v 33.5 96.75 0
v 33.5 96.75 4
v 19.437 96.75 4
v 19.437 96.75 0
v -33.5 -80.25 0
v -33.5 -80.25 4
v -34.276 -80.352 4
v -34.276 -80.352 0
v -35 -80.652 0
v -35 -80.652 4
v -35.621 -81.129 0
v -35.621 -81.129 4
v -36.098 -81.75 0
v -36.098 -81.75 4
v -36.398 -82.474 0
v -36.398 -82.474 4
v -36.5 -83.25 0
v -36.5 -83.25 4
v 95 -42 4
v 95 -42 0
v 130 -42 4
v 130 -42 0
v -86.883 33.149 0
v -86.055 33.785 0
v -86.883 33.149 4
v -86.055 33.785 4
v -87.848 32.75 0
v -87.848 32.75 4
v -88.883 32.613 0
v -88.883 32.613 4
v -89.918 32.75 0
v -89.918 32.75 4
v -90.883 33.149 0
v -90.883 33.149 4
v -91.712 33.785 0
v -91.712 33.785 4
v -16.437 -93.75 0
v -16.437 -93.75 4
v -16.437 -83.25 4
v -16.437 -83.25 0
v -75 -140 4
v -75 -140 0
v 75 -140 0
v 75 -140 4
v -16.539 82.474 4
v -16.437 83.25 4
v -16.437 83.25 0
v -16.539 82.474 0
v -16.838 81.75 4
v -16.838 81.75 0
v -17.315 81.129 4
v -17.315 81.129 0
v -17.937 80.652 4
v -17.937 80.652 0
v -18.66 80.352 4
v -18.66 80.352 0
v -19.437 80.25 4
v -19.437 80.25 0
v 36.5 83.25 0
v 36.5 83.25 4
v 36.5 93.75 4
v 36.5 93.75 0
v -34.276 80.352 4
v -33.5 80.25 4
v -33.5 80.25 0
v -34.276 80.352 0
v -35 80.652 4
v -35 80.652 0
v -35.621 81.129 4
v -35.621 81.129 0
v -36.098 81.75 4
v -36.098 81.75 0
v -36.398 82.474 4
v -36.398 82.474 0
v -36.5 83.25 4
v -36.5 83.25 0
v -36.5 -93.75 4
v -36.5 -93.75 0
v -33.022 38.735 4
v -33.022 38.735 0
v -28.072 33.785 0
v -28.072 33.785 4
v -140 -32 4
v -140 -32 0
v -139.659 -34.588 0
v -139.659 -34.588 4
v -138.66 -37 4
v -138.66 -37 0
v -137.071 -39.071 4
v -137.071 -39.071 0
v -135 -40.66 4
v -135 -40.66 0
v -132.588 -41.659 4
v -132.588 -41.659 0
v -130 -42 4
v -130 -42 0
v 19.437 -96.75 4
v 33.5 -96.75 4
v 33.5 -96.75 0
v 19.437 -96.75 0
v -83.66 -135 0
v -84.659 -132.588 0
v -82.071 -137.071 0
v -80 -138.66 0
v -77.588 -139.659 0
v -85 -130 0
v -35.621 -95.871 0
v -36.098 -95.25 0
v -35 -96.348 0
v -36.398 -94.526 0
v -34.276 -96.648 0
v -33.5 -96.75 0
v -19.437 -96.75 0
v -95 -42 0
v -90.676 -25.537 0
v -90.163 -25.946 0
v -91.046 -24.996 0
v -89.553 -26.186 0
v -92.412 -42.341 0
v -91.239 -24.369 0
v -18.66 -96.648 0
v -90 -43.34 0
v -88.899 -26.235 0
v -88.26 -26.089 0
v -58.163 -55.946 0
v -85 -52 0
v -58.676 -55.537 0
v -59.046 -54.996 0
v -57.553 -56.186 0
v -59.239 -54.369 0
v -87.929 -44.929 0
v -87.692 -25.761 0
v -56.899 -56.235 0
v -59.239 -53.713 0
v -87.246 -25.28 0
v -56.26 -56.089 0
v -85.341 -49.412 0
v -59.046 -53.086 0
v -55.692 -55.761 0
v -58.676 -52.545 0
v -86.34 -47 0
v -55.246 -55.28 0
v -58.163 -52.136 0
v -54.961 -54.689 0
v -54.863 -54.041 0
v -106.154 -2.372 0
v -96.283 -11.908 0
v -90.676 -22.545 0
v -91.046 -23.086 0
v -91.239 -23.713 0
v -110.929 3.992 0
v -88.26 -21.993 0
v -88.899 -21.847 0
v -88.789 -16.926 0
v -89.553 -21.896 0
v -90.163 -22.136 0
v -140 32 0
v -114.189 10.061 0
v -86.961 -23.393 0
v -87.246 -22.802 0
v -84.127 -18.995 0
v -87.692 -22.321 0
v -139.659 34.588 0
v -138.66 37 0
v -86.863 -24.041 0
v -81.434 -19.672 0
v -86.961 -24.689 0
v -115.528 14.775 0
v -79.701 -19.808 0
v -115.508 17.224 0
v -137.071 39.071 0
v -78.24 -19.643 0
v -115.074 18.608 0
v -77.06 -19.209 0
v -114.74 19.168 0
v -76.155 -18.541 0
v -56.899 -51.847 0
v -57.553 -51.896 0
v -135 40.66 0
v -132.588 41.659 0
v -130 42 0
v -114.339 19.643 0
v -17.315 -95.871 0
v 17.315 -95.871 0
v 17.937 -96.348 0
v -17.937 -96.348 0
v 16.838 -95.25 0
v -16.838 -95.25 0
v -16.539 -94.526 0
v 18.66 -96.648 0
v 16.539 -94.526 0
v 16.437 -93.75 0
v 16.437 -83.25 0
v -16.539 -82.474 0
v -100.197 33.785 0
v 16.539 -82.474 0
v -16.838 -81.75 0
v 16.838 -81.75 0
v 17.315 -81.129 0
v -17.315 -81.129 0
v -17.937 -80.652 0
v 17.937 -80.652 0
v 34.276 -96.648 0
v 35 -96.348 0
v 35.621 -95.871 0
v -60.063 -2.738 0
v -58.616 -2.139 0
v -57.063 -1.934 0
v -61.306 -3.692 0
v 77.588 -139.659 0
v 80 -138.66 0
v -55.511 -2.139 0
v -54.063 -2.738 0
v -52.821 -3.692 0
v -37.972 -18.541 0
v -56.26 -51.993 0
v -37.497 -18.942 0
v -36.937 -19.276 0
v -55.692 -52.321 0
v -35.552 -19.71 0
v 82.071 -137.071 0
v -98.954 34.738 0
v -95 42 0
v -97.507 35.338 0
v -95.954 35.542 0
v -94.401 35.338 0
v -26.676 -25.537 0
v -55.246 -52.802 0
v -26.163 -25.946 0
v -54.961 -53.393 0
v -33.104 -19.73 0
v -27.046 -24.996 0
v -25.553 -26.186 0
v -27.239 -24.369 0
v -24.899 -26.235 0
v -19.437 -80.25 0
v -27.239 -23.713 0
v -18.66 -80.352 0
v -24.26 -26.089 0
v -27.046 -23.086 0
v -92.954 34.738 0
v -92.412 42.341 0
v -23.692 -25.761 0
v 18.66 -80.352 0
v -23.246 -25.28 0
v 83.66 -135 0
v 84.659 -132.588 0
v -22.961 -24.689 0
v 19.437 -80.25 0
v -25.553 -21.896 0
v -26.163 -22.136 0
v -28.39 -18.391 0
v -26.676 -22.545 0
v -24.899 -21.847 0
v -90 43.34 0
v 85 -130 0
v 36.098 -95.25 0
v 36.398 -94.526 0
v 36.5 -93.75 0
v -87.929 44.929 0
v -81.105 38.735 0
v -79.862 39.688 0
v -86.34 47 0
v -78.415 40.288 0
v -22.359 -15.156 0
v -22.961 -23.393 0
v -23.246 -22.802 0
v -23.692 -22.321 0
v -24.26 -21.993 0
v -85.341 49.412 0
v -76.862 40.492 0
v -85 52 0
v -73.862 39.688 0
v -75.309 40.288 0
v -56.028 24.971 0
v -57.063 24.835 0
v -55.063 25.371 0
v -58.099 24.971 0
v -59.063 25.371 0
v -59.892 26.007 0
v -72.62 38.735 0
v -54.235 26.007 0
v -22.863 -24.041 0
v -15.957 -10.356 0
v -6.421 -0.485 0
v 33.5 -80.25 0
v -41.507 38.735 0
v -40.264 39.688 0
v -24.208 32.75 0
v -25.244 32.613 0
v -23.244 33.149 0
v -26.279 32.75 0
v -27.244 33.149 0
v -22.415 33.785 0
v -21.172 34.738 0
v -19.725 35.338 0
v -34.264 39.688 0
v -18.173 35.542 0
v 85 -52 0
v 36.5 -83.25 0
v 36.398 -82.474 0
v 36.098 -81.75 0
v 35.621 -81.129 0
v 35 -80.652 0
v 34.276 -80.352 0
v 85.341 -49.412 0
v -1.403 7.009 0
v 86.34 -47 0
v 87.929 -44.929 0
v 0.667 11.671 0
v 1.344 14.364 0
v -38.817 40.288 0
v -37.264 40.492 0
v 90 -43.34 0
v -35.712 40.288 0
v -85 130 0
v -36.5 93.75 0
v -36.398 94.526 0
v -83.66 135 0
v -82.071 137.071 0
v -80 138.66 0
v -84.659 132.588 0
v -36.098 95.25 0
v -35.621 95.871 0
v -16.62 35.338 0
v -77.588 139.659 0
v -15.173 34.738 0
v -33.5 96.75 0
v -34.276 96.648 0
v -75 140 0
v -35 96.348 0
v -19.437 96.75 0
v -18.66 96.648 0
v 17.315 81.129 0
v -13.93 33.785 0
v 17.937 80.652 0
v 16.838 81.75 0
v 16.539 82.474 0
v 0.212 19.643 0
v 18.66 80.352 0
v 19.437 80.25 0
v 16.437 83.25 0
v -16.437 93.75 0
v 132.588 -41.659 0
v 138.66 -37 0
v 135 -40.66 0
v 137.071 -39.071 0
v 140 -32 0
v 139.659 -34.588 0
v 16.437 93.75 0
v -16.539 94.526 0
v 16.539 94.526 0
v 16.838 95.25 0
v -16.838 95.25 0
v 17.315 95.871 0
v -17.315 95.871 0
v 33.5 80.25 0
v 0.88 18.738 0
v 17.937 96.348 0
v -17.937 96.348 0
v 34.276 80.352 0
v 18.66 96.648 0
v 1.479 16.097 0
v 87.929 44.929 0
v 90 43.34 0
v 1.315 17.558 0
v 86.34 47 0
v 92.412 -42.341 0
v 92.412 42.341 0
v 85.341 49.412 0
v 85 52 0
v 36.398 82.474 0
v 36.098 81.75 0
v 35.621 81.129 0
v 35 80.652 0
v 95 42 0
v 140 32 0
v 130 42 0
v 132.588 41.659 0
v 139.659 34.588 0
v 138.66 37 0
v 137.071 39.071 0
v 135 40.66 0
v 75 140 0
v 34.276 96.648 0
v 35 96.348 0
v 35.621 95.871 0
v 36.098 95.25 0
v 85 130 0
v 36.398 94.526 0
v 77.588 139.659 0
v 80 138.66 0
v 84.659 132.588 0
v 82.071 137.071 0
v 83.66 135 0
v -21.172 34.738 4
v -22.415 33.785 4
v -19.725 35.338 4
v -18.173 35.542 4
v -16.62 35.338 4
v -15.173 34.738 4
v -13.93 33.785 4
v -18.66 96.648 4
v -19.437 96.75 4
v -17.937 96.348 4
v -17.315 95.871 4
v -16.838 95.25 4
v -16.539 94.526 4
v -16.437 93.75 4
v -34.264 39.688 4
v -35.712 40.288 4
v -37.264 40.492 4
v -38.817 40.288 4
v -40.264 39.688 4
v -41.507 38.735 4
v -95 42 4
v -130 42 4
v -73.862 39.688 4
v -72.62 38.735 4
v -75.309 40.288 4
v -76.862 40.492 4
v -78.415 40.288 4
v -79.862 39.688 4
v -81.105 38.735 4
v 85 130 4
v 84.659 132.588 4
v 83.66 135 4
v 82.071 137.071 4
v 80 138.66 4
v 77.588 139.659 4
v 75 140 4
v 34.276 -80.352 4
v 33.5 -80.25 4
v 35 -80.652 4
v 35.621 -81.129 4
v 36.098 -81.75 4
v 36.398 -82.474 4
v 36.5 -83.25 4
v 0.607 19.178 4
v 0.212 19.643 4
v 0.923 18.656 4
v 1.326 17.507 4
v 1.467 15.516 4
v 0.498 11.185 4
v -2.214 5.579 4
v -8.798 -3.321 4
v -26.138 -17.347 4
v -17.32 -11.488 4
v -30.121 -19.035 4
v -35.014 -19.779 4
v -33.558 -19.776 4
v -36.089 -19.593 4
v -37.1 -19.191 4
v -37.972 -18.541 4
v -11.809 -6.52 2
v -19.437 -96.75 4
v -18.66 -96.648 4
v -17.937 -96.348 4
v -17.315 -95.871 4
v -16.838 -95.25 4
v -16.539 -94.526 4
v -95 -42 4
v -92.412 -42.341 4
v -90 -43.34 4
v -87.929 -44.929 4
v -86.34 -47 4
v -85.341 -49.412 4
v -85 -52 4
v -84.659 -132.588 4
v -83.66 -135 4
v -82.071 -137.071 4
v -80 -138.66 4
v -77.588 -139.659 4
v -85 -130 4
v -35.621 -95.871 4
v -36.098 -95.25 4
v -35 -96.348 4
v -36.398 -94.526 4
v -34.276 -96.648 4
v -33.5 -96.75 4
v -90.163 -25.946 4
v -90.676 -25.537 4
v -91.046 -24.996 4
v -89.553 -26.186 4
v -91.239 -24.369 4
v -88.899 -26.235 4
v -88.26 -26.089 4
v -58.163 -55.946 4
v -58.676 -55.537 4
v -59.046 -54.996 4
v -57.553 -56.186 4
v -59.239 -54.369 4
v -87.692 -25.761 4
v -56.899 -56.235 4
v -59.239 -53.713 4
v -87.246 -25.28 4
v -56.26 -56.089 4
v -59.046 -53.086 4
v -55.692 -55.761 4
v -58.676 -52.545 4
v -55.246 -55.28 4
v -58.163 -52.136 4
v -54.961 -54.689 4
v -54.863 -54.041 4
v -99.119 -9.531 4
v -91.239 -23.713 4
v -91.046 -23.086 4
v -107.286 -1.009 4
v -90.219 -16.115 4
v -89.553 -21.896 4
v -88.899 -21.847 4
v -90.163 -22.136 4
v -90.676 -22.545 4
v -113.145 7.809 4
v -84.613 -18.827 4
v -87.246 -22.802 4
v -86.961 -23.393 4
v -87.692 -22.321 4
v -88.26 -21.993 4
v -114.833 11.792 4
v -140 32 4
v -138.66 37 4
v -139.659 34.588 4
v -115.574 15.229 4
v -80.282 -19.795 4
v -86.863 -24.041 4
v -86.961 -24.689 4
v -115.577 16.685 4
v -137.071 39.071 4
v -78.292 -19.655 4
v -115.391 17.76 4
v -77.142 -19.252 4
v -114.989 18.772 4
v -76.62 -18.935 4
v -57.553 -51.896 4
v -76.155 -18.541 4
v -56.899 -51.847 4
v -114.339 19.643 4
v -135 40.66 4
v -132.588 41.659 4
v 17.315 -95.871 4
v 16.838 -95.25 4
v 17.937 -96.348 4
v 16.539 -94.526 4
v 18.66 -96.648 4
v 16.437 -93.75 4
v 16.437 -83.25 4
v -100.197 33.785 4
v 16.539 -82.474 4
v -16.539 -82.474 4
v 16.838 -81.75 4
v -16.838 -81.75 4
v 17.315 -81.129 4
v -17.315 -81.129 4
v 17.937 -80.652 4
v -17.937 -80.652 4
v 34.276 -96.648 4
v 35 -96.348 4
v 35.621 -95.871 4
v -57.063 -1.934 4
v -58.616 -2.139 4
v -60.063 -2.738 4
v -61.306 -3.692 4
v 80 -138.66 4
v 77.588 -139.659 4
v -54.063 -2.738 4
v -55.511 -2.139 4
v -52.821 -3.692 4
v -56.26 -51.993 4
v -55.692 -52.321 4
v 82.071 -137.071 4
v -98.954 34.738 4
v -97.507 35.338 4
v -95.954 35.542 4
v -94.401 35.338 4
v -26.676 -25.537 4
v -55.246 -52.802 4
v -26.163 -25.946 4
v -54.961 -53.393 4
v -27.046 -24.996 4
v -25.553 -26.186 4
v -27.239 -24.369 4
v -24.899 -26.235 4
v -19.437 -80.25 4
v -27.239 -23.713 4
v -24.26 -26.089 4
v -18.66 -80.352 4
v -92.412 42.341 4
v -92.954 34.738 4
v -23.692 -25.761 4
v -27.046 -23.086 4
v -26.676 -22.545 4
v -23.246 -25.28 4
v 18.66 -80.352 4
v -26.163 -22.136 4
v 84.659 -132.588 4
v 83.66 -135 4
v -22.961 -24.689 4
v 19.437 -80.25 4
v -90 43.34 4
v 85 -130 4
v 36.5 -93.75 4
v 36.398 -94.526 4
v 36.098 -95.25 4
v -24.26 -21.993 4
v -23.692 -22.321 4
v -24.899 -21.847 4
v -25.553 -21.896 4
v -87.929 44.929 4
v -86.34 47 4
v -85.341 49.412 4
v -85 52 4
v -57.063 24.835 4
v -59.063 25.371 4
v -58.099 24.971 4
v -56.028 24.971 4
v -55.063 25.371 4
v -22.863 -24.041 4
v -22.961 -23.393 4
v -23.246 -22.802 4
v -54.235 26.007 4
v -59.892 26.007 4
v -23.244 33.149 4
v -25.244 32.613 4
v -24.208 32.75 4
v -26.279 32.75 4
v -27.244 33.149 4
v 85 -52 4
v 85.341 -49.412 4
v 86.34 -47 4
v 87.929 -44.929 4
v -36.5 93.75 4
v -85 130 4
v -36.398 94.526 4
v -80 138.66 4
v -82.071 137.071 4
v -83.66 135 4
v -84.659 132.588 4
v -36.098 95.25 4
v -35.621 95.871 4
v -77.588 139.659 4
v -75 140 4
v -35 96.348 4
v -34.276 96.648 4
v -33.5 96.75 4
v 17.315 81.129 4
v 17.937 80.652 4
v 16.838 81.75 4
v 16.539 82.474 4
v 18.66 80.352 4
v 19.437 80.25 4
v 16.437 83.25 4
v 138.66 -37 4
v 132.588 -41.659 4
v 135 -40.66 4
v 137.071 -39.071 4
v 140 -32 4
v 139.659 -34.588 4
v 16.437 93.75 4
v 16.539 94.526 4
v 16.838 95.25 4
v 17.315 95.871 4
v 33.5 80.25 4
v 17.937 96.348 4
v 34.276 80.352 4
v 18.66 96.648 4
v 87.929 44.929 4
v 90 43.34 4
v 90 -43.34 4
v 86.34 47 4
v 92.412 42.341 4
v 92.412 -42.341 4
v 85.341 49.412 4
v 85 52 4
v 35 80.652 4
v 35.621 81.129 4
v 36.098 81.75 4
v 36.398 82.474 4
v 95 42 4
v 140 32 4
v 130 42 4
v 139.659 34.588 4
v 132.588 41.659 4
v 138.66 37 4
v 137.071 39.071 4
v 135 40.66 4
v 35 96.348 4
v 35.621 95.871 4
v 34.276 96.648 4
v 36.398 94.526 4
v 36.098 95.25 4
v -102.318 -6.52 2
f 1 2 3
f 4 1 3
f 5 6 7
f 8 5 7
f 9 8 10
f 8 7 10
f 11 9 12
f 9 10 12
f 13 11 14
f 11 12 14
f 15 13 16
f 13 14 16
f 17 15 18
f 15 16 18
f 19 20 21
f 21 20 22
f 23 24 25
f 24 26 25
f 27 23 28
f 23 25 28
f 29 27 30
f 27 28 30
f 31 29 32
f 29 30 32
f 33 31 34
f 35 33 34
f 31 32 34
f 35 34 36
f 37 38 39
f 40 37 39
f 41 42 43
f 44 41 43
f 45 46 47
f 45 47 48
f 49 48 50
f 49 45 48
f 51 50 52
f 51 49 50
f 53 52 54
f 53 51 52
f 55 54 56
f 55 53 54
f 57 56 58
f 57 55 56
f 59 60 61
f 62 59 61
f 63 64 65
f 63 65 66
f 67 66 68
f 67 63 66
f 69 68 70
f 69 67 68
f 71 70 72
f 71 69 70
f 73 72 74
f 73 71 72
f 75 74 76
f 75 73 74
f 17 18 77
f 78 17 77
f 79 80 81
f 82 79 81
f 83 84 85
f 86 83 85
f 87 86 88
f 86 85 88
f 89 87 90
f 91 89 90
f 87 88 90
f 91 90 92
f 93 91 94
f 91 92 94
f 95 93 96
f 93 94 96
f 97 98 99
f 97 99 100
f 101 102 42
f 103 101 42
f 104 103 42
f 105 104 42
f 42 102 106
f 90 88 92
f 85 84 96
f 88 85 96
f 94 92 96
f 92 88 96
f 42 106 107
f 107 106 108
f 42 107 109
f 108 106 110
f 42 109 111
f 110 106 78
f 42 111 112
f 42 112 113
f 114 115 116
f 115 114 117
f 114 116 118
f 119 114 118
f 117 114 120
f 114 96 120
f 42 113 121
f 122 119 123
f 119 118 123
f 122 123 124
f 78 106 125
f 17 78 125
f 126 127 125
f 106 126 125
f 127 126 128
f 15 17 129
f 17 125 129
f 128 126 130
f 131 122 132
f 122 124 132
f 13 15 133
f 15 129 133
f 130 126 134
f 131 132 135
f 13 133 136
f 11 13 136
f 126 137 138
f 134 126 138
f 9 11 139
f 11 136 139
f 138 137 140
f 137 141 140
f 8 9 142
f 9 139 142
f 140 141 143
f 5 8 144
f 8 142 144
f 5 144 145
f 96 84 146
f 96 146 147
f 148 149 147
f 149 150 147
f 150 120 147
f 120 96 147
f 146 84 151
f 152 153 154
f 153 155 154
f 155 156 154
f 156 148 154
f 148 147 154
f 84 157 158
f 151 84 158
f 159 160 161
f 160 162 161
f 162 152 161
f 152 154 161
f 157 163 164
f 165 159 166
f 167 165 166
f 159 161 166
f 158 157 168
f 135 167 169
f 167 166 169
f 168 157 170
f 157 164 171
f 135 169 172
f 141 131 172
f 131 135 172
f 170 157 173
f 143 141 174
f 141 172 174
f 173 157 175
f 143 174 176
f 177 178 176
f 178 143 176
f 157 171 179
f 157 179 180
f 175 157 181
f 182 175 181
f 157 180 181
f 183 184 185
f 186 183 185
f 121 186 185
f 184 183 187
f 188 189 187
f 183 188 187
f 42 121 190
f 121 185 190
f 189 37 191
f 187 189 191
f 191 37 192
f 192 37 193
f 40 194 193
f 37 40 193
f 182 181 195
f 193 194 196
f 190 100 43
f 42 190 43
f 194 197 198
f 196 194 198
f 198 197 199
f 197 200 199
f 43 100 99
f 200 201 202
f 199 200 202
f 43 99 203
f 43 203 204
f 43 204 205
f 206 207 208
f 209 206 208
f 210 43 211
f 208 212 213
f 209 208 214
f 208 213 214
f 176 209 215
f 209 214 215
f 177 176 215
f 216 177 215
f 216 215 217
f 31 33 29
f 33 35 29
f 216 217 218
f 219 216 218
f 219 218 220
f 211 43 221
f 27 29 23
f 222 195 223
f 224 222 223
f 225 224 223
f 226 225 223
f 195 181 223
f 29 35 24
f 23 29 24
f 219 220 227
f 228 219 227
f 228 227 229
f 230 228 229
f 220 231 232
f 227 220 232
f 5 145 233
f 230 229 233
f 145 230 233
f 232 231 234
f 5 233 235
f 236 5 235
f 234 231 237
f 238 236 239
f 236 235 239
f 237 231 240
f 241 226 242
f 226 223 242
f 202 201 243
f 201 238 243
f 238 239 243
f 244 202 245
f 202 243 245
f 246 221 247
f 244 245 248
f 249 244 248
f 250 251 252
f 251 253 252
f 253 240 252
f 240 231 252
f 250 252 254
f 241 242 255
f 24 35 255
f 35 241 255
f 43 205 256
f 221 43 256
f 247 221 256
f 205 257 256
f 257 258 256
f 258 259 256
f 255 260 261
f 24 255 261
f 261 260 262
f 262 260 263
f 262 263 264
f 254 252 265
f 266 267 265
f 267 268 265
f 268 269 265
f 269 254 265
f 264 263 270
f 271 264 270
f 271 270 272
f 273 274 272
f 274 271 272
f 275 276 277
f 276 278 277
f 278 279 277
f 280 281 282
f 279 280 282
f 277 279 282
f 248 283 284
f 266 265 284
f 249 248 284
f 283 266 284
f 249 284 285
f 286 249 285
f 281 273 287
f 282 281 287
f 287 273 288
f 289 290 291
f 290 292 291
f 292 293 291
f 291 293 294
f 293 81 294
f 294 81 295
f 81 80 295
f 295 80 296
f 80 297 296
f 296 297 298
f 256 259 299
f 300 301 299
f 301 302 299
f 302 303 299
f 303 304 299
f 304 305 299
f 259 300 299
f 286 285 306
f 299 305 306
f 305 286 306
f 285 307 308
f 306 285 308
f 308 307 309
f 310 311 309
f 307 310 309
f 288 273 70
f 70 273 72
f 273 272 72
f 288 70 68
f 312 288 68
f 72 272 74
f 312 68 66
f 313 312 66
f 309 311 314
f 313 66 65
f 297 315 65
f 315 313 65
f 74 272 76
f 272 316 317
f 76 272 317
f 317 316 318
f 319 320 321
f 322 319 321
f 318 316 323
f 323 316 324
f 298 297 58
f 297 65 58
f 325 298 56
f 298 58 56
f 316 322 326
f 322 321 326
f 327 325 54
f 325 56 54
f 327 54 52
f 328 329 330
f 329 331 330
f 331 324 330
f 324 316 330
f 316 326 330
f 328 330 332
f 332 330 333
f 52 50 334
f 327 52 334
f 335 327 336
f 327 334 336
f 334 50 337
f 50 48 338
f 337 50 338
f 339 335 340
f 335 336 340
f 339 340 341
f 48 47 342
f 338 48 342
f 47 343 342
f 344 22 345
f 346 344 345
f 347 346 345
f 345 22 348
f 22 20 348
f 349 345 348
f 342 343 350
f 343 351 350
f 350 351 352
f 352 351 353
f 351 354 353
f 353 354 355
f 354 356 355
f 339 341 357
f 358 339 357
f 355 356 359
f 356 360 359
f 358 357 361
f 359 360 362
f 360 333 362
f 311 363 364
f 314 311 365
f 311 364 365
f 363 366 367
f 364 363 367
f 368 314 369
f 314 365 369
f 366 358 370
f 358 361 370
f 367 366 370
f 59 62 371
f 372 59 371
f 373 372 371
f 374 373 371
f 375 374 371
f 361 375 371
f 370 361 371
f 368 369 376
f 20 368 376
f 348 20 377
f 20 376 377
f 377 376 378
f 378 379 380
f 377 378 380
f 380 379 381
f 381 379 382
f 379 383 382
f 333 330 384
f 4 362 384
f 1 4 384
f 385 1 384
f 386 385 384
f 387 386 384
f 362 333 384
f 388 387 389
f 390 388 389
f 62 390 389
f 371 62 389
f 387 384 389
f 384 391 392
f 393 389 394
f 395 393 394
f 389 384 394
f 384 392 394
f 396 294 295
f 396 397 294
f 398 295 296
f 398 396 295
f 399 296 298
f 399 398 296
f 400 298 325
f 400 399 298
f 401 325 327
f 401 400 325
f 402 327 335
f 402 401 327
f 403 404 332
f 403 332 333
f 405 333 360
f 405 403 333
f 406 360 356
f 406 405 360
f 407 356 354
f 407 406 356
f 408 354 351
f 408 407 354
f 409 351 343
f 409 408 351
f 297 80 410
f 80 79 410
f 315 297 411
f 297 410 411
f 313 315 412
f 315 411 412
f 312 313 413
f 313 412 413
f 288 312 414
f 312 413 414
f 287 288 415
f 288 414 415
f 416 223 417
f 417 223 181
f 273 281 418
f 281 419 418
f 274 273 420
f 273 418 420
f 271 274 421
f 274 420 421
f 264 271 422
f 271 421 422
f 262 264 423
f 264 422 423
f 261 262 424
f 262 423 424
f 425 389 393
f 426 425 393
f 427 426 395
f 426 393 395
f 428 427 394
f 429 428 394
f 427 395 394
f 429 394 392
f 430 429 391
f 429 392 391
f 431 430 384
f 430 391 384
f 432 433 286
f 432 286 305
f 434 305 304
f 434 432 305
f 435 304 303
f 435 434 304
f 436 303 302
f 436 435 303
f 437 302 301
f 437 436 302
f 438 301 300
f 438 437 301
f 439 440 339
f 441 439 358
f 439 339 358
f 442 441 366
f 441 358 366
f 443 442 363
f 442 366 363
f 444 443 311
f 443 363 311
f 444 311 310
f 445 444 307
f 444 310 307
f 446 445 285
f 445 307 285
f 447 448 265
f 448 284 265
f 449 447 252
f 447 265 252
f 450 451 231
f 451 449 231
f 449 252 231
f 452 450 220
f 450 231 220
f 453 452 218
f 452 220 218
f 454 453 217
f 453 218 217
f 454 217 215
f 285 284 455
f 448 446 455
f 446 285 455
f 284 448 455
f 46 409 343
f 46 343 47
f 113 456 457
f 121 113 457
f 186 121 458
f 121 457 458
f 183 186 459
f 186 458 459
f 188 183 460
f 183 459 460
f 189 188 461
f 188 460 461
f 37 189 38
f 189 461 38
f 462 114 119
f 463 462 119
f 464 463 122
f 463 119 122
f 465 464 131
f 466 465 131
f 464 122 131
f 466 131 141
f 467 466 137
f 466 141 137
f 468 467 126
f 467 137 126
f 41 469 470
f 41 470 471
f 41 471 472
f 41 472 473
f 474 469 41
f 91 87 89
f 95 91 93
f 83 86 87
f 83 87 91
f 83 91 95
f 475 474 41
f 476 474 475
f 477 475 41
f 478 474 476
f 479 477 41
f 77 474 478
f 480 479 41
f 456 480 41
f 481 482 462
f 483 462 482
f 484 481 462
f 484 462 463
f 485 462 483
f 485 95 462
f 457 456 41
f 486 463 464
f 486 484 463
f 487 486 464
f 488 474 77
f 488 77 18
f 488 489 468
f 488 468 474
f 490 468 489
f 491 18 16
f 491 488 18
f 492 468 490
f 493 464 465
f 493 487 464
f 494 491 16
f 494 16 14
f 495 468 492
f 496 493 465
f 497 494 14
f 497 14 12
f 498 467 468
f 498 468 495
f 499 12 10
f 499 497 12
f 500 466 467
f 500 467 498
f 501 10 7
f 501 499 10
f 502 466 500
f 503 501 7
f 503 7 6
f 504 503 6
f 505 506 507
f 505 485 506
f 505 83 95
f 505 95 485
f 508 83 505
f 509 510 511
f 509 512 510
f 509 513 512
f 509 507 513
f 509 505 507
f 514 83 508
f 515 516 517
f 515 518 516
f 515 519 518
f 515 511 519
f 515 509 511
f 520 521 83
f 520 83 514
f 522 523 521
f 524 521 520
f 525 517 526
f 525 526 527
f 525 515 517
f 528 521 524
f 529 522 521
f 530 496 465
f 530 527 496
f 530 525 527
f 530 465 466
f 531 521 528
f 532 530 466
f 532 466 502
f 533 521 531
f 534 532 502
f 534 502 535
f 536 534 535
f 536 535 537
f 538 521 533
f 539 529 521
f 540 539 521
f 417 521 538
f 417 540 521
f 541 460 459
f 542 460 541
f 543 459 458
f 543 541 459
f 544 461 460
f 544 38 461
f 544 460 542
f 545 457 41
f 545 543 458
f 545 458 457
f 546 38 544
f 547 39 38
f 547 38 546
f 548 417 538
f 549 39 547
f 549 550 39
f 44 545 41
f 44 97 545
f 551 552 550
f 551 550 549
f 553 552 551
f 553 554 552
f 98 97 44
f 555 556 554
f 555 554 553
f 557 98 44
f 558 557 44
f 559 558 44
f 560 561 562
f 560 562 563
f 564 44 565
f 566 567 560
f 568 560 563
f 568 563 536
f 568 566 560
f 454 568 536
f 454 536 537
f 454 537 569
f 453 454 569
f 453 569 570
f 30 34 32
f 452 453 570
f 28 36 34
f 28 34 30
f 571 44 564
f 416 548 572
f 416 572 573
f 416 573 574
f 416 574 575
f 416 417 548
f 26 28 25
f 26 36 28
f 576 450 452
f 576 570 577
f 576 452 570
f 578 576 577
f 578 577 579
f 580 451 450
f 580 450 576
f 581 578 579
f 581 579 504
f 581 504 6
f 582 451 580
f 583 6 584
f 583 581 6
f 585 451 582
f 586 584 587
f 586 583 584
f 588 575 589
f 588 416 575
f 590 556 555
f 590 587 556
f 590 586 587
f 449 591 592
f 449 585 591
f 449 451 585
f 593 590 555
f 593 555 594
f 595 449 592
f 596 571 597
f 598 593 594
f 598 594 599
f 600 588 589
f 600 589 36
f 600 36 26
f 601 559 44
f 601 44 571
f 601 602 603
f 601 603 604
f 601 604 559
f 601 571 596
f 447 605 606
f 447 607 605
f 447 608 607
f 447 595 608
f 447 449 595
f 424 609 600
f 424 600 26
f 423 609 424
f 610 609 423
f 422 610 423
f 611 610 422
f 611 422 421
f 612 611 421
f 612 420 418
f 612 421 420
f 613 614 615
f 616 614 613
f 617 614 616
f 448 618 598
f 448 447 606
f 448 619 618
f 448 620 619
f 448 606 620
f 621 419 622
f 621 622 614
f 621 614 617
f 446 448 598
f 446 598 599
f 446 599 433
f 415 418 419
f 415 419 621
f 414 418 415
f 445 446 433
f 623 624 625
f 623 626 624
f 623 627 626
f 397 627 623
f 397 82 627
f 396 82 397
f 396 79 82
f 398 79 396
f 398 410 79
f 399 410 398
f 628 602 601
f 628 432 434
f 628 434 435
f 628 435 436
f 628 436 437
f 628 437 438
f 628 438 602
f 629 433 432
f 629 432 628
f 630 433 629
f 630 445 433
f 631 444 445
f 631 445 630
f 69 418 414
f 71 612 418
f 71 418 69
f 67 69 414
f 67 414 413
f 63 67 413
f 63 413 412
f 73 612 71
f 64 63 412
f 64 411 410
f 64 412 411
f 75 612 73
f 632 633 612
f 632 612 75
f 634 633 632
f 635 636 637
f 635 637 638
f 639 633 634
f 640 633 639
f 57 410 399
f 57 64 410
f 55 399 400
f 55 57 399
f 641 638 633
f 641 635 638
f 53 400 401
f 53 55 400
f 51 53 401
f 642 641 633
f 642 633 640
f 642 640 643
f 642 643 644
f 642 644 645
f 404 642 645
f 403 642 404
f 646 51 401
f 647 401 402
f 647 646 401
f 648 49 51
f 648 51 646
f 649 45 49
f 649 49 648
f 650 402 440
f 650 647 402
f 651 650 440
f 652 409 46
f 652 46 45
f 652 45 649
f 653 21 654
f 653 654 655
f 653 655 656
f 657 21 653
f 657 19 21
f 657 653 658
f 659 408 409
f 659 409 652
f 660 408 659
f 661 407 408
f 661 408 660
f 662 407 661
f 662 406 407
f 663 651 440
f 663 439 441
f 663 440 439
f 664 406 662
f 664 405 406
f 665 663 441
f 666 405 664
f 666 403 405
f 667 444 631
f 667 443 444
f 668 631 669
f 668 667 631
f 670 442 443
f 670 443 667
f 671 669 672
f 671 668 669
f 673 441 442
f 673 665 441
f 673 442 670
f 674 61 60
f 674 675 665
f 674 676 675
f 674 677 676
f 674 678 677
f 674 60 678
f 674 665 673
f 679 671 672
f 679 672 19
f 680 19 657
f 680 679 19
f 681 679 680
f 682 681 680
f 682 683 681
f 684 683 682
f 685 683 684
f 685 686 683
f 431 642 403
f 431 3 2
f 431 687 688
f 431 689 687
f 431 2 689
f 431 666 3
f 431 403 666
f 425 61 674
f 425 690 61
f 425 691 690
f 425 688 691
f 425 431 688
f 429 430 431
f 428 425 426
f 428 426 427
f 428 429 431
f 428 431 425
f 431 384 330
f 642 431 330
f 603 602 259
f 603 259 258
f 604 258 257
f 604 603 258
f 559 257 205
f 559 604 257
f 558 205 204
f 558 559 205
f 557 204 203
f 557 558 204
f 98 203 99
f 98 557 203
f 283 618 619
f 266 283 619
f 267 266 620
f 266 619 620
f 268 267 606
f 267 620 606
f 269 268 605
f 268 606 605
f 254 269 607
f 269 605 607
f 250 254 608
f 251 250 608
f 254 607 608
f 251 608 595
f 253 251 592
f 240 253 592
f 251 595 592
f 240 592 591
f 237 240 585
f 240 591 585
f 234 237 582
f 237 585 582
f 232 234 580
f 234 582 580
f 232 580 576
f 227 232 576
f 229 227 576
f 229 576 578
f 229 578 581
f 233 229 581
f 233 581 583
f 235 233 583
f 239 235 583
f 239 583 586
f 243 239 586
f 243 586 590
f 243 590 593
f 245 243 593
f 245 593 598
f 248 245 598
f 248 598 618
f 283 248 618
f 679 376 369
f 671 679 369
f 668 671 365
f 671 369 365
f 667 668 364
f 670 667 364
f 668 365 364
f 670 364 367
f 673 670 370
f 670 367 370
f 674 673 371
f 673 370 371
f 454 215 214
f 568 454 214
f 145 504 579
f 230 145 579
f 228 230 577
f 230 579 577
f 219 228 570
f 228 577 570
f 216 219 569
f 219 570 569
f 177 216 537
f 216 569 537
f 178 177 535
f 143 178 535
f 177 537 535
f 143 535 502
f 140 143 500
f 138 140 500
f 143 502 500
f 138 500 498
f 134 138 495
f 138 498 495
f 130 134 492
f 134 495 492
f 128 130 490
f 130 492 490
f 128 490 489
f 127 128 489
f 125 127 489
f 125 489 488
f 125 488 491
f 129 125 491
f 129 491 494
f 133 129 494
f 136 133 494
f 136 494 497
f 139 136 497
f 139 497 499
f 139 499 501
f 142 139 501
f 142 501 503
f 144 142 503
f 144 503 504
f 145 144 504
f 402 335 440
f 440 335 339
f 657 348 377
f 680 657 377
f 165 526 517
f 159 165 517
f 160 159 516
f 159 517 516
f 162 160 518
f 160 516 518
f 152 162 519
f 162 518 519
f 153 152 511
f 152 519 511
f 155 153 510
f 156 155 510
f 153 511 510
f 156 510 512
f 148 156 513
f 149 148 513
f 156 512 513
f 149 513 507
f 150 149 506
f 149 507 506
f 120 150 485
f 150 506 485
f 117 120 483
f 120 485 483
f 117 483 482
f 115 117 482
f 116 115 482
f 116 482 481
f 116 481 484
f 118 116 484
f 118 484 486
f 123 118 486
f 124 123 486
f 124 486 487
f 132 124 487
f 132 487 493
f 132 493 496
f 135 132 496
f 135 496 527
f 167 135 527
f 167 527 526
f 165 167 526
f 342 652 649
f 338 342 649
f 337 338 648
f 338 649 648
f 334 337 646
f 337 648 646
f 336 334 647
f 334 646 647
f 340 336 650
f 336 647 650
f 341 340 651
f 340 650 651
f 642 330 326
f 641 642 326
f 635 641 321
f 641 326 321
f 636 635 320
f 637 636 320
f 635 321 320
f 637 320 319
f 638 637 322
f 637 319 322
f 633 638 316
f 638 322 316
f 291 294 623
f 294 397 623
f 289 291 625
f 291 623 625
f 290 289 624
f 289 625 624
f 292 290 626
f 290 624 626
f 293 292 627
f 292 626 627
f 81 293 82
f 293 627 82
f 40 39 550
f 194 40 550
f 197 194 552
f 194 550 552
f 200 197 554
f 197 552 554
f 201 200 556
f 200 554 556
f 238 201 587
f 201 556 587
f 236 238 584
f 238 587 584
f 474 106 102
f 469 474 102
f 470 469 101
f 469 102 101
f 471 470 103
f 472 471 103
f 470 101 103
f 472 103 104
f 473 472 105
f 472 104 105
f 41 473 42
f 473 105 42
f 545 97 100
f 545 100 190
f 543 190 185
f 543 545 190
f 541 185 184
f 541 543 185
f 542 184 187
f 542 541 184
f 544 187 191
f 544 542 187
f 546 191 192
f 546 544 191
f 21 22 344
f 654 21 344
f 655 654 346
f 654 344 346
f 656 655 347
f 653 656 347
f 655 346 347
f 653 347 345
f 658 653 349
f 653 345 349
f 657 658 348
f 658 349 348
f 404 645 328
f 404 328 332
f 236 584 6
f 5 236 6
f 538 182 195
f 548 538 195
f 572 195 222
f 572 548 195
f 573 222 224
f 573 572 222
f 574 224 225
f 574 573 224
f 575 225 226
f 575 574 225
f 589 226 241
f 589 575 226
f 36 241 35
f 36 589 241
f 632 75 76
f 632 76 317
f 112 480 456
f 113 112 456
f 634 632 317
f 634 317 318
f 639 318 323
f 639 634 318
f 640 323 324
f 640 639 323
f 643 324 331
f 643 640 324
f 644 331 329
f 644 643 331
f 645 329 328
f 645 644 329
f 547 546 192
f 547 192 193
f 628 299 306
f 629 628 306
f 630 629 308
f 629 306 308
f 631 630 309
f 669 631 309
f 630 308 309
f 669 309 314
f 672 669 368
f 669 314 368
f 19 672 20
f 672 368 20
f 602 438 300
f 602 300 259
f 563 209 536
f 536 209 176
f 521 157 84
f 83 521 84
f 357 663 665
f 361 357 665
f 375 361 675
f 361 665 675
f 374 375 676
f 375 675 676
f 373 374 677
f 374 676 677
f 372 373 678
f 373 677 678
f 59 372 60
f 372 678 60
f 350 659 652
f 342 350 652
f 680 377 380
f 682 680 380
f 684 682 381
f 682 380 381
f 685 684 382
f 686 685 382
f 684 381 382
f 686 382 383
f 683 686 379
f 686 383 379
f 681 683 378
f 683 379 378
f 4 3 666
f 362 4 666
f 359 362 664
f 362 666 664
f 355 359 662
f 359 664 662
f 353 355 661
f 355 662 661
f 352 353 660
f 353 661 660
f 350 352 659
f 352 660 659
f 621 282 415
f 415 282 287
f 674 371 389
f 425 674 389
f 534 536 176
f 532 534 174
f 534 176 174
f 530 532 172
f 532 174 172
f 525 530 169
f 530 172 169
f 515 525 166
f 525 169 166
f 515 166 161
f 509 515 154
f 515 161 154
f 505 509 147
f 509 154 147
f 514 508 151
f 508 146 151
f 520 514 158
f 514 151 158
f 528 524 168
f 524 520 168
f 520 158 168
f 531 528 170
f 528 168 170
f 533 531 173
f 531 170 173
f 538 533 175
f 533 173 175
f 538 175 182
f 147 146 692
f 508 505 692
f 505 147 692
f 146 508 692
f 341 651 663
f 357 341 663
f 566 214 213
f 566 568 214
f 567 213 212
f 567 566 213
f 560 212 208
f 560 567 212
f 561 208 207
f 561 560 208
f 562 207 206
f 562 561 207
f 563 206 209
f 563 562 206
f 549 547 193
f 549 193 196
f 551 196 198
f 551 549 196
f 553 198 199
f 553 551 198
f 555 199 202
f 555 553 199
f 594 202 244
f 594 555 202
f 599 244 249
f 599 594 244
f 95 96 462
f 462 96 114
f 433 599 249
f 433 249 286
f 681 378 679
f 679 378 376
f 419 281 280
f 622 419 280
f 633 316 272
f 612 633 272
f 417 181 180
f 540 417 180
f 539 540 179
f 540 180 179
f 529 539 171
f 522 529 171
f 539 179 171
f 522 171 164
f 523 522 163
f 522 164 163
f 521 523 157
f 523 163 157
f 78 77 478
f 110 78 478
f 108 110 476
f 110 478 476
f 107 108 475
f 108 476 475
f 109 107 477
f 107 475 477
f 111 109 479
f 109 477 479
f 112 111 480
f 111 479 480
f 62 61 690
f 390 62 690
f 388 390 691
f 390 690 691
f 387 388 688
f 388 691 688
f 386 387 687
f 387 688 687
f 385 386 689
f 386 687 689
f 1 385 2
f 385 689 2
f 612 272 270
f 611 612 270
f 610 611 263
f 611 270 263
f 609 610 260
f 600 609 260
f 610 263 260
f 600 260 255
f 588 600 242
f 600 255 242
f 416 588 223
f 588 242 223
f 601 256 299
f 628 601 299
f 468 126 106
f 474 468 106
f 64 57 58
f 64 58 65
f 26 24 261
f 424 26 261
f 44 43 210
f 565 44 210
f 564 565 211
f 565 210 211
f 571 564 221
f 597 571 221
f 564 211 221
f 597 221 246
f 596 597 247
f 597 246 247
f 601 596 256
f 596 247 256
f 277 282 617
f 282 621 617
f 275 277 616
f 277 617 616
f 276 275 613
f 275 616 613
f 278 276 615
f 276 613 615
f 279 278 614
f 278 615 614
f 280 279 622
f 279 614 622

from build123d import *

# Parameters (mm, degrees)
EXTRUDE_1_DEPTH                           = 4
CUT_EXTRUDE_1_REACH                       = 200.03
MIRROR_1_AT_THE_SECOND_PLANE_COPY_1_REACH = 200.03
CUT_EXTRUDE_2_REACH                       = 200.03
FILLET_1_R                                = 4
FILLET_2_R                                = 6
CUT_EXTRUDE_3_REACH                       = 200.03
SKETCH_7_R                                = 2.2


with BuildPart() as part:
    # 草图1 → 凸台-拉伸1 (new body)
    with BuildSketch(Plane.XY):
        with BuildLine():
            Line((85, 52), (85, 130))
            ThreePointArc((85, 130), (82.071067812, 137.071067812), (75, 140))
            Line((75, 140), (-75, 140))
            ThreePointArc((-75, 140), (-82.071067812, 137.071067812), (-85, 130))
            Line((-85, 130), (-85, 52))
            ThreePointArc((-85, 52), (-87.928932188, 44.928932188), (-95, 42))
            Line((-95, 42), (-130, 42))
            ThreePointArc((-130, 42), (-137.071067812, 39.071067812), (-140, 32))
            Line((-140, 32), (-140, -32))
            ThreePointArc((-140, -32), (-137.071067812, -39.071067812), (-130, -42))
            Line((-130, -42), (-95, -42))
            ThreePointArc((-95, -42), (-87.928932188, -44.928932188), (-85, -52))
            Line((-85, -52), (-85, -130))
            ThreePointArc((-85, -130), (-82.071067812, -137.071067812), (-75, -140))
            Line((-75, -140), (75, -140))
            ThreePointArc((75, -140), (82.071067812, -137.071067812), (85, -130))
            Line((85, -130), (85, -52))
            ThreePointArc((85, -52), (87.928932188, -44.928932188), (95, -42))
            Line((95, -42), (130, -42))
            ThreePointArc((130, -42), (137.071067812, -39.071067812), (140, -32))
            Line((140, -32), (140, 32))
            ThreePointArc((140, 32), (137.071067812, 39.071067812), (130, 42))
            Line((130, 42), (95, 42))
            ThreePointArc((95, 42), (87.928932188, 44.928932188), (85, 52))
        make_face()
    extrude(amount=EXTRUDE_1_DEPTH)

    # 草图2 → 切除-拉伸1 (cut, up to next)
    with BuildSketch(Plane.XY.offset(4), mode=Mode.PRIVATE) as cut_extrude_1_sk1:
        with BuildLine():
            Line((33.5, -96.75), (19.436562746, -96.75))
            ThreePointArc((19.436562746, -96.75), (17.315242402, -95.871320344), (16.436562746, -93.75))
            Line((16.436562746, -93.75), (16.436562746, -83.25))
            ThreePointArc((16.436562746, -83.25), (17.315242402, -81.128679656), (19.436562746, -80.25))
            Line((19.436562746, -80.25), (33.5, -80.25))
            ThreePointArc((33.5, -80.25), (35.621320344, -81.128679656), (36.5, -83.25))
            Line((36.5, -83.25), (36.5, -93.75))
            ThreePointArc((36.5, -93.75), (35.621320344, -95.871320344), (33.5, -96.75))
        make_face()
    cut_extrude_1_tool1 = extrude(cut_extrude_1_sk1.sketch, amount=-CUT_EXTRUDE_1_REACH, mode=Mode.PRIVATE) & part.part
    cut_extrude_1 = cut_extrude_1_tool1.solids().sort_by_distance((26.468281, -88.5, 4))[0]
    add(cut_extrude_1, mode=Mode.SUBTRACT)

    # 镜向1: 切除-拉伸1 across plane
    add(cut_extrude_1.mirror(Plane(origin=(0, 0, 0), x_dir=(0, 0, 1), z_dir=(1, 0, 0))), mode=Mode.SUBTRACT)

    # 镜向1 at the second plane: 切除-拉伸1 across plane
    add(cut_extrude_1.mirror(Plane.ZX), mode=Mode.SUBTRACT)

    # 镜向1 at the second plane copy 1 sket → 镜向1 at the second plane copy 1 (cut, up to next)
    with BuildSketch(Plane(origin=(0, 0, 4), x_dir=(-1, 0, 0), z_dir=(0, 0, 1)), mode=Mode.PRIVATE) as mirror_1_at_the_second_plane_copy_1_sk1:
        with BuildLine():
            Line((33.5, -96.75), (19.436562746, -96.75))
            ThreePointArc((19.436562746, -96.75), (17.315242402, -95.871320344), (16.436562746, -93.75))
            Line((16.436562746, -93.75), (16.436562746, -83.25))
            ThreePointArc((16.436562746, -83.25), (17.315242402, -81.128679656), (19.436562746, -80.25))
            Line((19.436562746, -80.25), (33.5, -80.25))
            ThreePointArc((33.5, -80.25), (35.621320344, -81.128679656), (36.5, -83.25))
            Line((36.5, -83.25), (36.5, -93.75))
            ThreePointArc((36.5, -93.75), (35.621320344, -95.871320344), (33.5, -96.75))
        make_face()
    mirror_1_at_the_second_plane_copy_1_tool1 = extrude(mirror_1_at_the_second_plane_copy_1_sk1.sketch, amount=-MIRROR_1_AT_THE_SECOND_PLANE_COPY_1_REACH, mode=Mode.PRIVATE) & part.part
    add(mirror_1_at_the_second_plane_copy_1_tool1.solids().sort_by_distance((-26.468281, 88.5, 4))[0], mode=Mode.SUBTRACT)

    # 草图6 → 切除-拉伸2 (cut, up to next)
    with BuildSketch(Plane(origin=(0, 0, 0), x_dir=(-1, 0, 0), z_dir=(0, 0, -1)), mode=Mode.PRIVATE) as cut_extrude_2_sk1:
        with BuildLine():
            Line((114.339040254, 19.642746522), (95.954263943, 38.027522832))
            Line((95.954263943, 38.027522832), (88.883196131, 30.956455021))
            Line((88.883196131, 30.956455021), (76.862380851, 42.977270301))
            Line((76.862380851, 42.977270301), (57.063390978, 23.178280428))
            Line((57.063390978, 23.178280428), (37.264401104, 42.977270301))
            Line((37.264401104, 42.977270301), (25.243585824, 30.956455021))
            Line((25.243585824, 30.956455021), (18.172518012, 38.027522832))
            Line((18.172518012, 38.027522832), (-0.212258298, 19.642746522))
            add(Edge.make_bspline(
                [(37.971507886, -18.541019662), (45.042575698, -11.469951851), (25.950692606, 7.621931241), (6.858809513, 26.713814333), (-0.212258298, 19.642746522)],
                knots=[3.141592654, 3.141592654, 3.141592654, 4.71238898, 4.71238898, 6.283185307, 6.283185307, 6.283185307], degree=2, weights=[1, 0.707106781, 1, 0.707106781, 1]))
            Line((37.971507886, -18.541019662), (57.063390978, 0.55086343))
            Line((57.063390978, 0.55086343), (76.15527407, -18.541019662))
            add(Edge.make_bspline(
                [(114.339040254, 19.642746522), (107.267972442, 26.713814333), (88.17608935, 7.621931241), (69.084206258, -11.469951851), (76.15527407, -18.541019662)],
                knots=[0, 0, 0, 1.570796327, 1.570796327, 3.141592654, 3.141592654, 3.141592654], degree=2, weights=[1, 0.707106781, 1, 0.707106781, 1]))
        make_face()
    cut_extrude_2_tool1 = extrude(cut_extrude_2_sk1.sketch, amount=-CUT_EXTRUDE_2_REACH, mode=Mode.PRIVATE) & part.part
    # 草图6 → 切除-拉伸2 (cut, up to next)
    with BuildSketch(Plane(origin=(0, 0, 0), x_dir=(-1, 0, 0), z_dir=(0, 0, -1)), mode=Mode.PRIVATE) as cut_extrude_2_sk2:
        with BuildLine():
            add(Edge.make_bspline(
                [(-0.212258298, 19.642746522), (-7.28332611, 12.57167871), (11.808556982, -6.520204382), (30.900440074, -25.612087474), (37.971507886, -18.541019662)],
                knots=[0, 0, 0, 1.570796327, 1.570796327, 3.141592654, 3.141592654, 3.141592654], degree=2, weights=[1, 0.707106781, 1, 0.707106781, 1]))
            Line((37.971507886, -18.541019662), (-0.212258298, 19.642746522))
        make_face()
    cut_extrude_2_tool2 = extrude(cut_extrude_2_sk2.sketch, amount=-CUT_EXTRUDE_2_REACH, mode=Mode.PRIVATE) & part.part
    # 草图6 → 切除-拉伸2 (cut, up to next)
    with BuildSketch(Plane(origin=(0, 0, 0), x_dir=(-1, 0, 0), z_dir=(0, 0, -1)), mode=Mode.PRIVATE) as cut_extrude_2_sk3:
        with BuildLine():
            Line((-0.212258298, 19.642746522), (37.971507886, -18.541019662))
            add(Edge.make_bspline(
                [(37.971507886, -18.541019662), (45.042575698, -11.469951851), (25.950692606, 7.621931241), (6.858809513, 26.713814333), (-0.212258298, 19.642746522)],
                knots=[3.141592654, 3.141592654, 3.141592654, 4.71238898, 4.71238898, 6.283185307, 6.283185307, 6.283185307], degree=2, weights=[1, 0.707106781, 1, 0.707106781, 1]))
        make_face()
    cut_extrude_2_tool3 = extrude(cut_extrude_2_sk3.sketch, amount=-CUT_EXTRUDE_2_REACH, mode=Mode.PRIVATE) & part.part
    # 草图6 → 切除-拉伸2 (cut, up to next)
    with BuildSketch(Plane(origin=(0, 0, 0), x_dir=(-1, 0, 0), z_dir=(0, 0, -1)), mode=Mode.PRIVATE) as cut_extrude_2_sk4:
        with BuildLine():
            add(Edge.make_bspline(
                [(-0.212258298, 19.642746522), (-7.28332611, 12.57167871), (11.808556982, -6.520204382), (30.900440074, -25.612087474), (37.971507886, -18.541019662)],
                knots=[0, 0, 0, 1.570796327, 1.570796327, 3.141592654, 3.141592654, 3.141592654], degree=2, weights=[1, 0.707106781, 1, 0.707106781, 1]))
            Line((37.971507886, -18.541019662), (-0.212258298, 19.642746522))
        make_face()
    cut_extrude_2_tool4 = extrude(cut_extrude_2_sk4.sketch, amount=-CUT_EXTRUDE_2_REACH, mode=Mode.PRIVATE) & part.part
    # 草图6 → 切除-拉伸2 (cut, up to next)
    with BuildSketch(Plane(origin=(0, 0, 0), x_dir=(-1, 0, 0), z_dir=(0, 0, -1)), mode=Mode.PRIVATE) as cut_extrude_2_sk5:
        with BuildLine():
            Line((-0.212258298, 19.642746522), (37.971507886, -18.541019662))
            add(Edge.make_bspline(
                [(37.971507886, -18.541019662), (45.042575698, -11.469951851), (25.950692606, 7.621931241), (6.858809513, 26.713814333), (-0.212258298, 19.642746522)],
                knots=[3.141592654, 3.141592654, 3.141592654, 4.71238898, 4.71238898, 6.283185307, 6.283185307, 6.283185307], degree=2, weights=[1, 0.707106781, 1, 0.707106781, 1]))
        make_face()
    cut_extrude_2_tool5 = extrude(cut_extrude_2_sk5.sketch, amount=-CUT_EXTRUDE_2_REACH, mode=Mode.PRIVATE) & part.part
    # 草图6 → 切除-拉伸2 (cut, up to next)
    with BuildSketch(Plane(origin=(0, 0, 0), x_dir=(-1, 0, 0), z_dir=(0, 0, -1)), mode=Mode.PRIVATE) as cut_extrude_2_sk6:
        with BuildLine():
            add(Edge.make_bspline(
                [(76.15527407, -18.541019662), (83.226341882, -25.612087474), (102.318224974, -6.520204382), (121.410108066, 12.57167871), (114.339040254, 19.642746522)],
                knots=[3.141592654, 3.141592654, 3.141592654, 4.71238898, 4.71238898, 6.283185307, 6.283185307, 6.283185307], degree=2, weights=[1, 0.707106781, 1, 0.707106781, 1]))
            Line((114.339040254, 19.642746522), (76.15527407, -18.541019662))
        make_face()
    cut_extrude_2_tool6 = extrude(cut_extrude_2_sk6.sketch, amount=-CUT_EXTRUDE_2_REACH, mode=Mode.PRIVATE) & part.part
    # 草图6 → 切除-拉伸2 (cut, up to next)
    with BuildSketch(Plane(origin=(0, 0, 0), x_dir=(-1, 0, 0), z_dir=(0, 0, -1)), mode=Mode.PRIVATE) as cut_extrude_2_sk7:
        with BuildLine():
            Line((76.15527407, -18.541019662), (114.339040254, 19.642746522))
            add(Edge.make_bspline(
                [(114.339040254, 19.642746522), (107.267972442, 26.713814333), (88.17608935, 7.621931241), (69.084206258, -11.469951851), (76.15527407, -18.541019662)],
                knots=[0, 0, 0, 1.570796327, 1.570796327, 3.141592654, 3.141592654, 3.141592654], degree=2, weights=[1, 0.707106781, 1, 0.707106781, 1]))
        make_face()
    cut_extrude_2_tool7 = extrude(cut_extrude_2_sk7.sketch, amount=-CUT_EXTRUDE_2_REACH, mode=Mode.PRIVATE) & part.part
    # 草图6 → 切除-拉伸2 (cut, up to next)
    with BuildSketch(Plane(origin=(0, 0, 0), x_dir=(-1, 0, 0), z_dir=(0, 0, -1)), mode=Mode.PRIVATE) as cut_extrude_2_sk8:
        with BuildLine():
            add(Edge.make_bspline(
                [(76.15527407, -18.541019662), (83.226341882, -25.612087474), (102.318224974, -6.520204382), (121.410108066, 12.57167871), (114.339040254, 19.642746522)],
                knots=[3.141592654, 3.141592654, 3.141592654, 4.71238898, 4.71238898, 6.283185307, 6.283185307, 6.283185307], degree=2, weights=[1, 0.707106781, 1, 0.707106781, 1]))
            Line((114.339040254, 19.642746522), (76.15527407, -18.541019662))
        make_face()
    cut_extrude_2_tool8 = extrude(cut_extrude_2_sk8.sketch, amount=-CUT_EXTRUDE_2_REACH, mode=Mode.PRIVATE) & part.part
    # 草图6 → 切除-拉伸2 (cut, up to next)
    with BuildSketch(Plane(origin=(0, 0, 0), x_dir=(-1, 0, 0), z_dir=(0, 0, -1)), mode=Mode.PRIVATE) as cut_extrude_2_sk9:
        with BuildLine():
            Line((76.15527407, -18.541019662), (114.339040254, 19.642746522))
            add(Edge.make_bspline(
                [(114.339040254, 19.642746522), (107.267972442, 26.713814333), (88.17608935, 7.621931241), (69.084206258, -11.469951851), (76.15527407, -18.541019662)],
                knots=[0, 0, 0, 1.570796327, 1.570796327, 3.141592654, 3.141592654, 3.141592654], degree=2, weights=[1, 0.707106781, 1, 0.707106781, 1]))
        make_face()
    cut_extrude_2_tool9 = extrude(cut_extrude_2_sk9.sketch, amount=-CUT_EXTRUDE_2_REACH, mode=Mode.PRIVATE) & part.part
    add(cut_extrude_2_tool1.solids().sort_by_distance((-57.063391, 16.654228, 0))[0], mode=Mode.SUBTRACT)
    add(cut_extrude_2_tool2.solids().sort_by_distance((-15.933802, -2.435893, 0))[0], mode=Mode.SUBTRACT)
    add(cut_extrude_2_tool3.solids().sort_by_distance((-21.830862, 3.579723, 0))[0], mode=Mode.SUBTRACT)
    add(cut_extrude_2_tool4.solids().sort_by_distance((-15.933802, -2.435893, 0))[0], mode=Mode.SUBTRACT)
    add(cut_extrude_2_tool5.solids().sort_by_distance((-21.830862, 3.579723, 0))[0], mode=Mode.SUBTRACT)
    add(cut_extrude_2_tool6.solids().sort_by_distance((-98.198394, -2.477996, 0))[0], mode=Mode.SUBTRACT)
    add(cut_extrude_2_tool7.solids().sort_by_distance((-92.301335, 3.53762, 0))[0], mode=Mode.SUBTRACT)
    add(cut_extrude_2_tool8.solids().sort_by_distance((-98.198394, -2.477996, 0))[0], mode=Mode.SUBTRACT)
    add(cut_extrude_2_tool9.solids().sort_by_distance((-92.301335, 3.53762, 0))[0], mode=Mode.SUBTRACT)

    # 圆角1
    fillet_1_edges = [part.edges().sort_by_distance(p)[0] for p in [
        (-25.243585824, 30.956455021, 2),
        (-57.063390978, 23.178280428, 2),
        (-88.883196131, 30.956455021, 2),
    ]]
    fillet(fillet_1_edges, radius=FILLET_1_R)

    # 圆角2
    fillet_2_edges = [part.edges().sort_by_distance(p)[0] for p in [
        (-57.063390978, 0.55086343, 2),
        (-18.172518012, 38.027522832, 2),
        (-76.862380851, 42.977270301, 2),
        (-37.264401104, 42.977270301, 2),
        (-95.954263943, 38.027522832, 2),
    ]]
    fillet(fillet_2_edges, radius=FILLET_2_R - 0.0001)  # a hair under: the kernel refuses the full size

    # 草图7 → 切除-拉伸3 (cut, up to next)
    with BuildSketch(Plane.XY.offset(4), mode=Mode.PRIVATE) as cut_extrude_3_sk1:
        with Locations((-89.063390978, -24.041019662)):
            Circle(SKETCH_7_R)
    cut_extrude_3_tool1 = extrude(cut_extrude_3_sk1.sketch, amount=-CUT_EXTRUDE_3_REACH, mode=Mode.PRIVATE) & part.part
    # 草图7 → 切除-拉伸3 (cut, up to next)
    with BuildSketch(Plane.XY.offset(4), mode=Mode.PRIVATE) as cut_extrude_3_sk2:
        with Locations((-57.063390978, -54.041019663)):
            Circle(SKETCH_7_R)
    cut_extrude_3_tool2 = extrude(cut_extrude_3_sk2.sketch, amount=-CUT_EXTRUDE_3_REACH, mode=Mode.PRIVATE) & part.part
    # 草图7 → 切除-拉伸3 (cut, up to next)
    with BuildSketch(Plane.XY.offset(4), mode=Mode.PRIVATE) as cut_extrude_3_sk3:
        with Locations((-25.063390978, -24.041019662)):
            Circle(SKETCH_7_R)
    cut_extrude_3_tool3 = extrude(cut_extrude_3_sk3.sketch, amount=-CUT_EXTRUDE_3_REACH, mode=Mode.PRIVATE) & part.part
    add(cut_extrude_3_tool1.solids().sort_by_distance((-89.063391, -24.04102, 4))[0], mode=Mode.SUBTRACT)
    add(cut_extrude_3_tool2.solids().sort_by_distance((-57.063391, -54.04102, 4))[0], mode=Mode.SUBTRACT)
    add(cut_extrude_3_tool3.solids().sort_by_distance((-25.063391, -24.04102, 4))[0], mode=Mode.SUBTRACT)


solid = part.part
